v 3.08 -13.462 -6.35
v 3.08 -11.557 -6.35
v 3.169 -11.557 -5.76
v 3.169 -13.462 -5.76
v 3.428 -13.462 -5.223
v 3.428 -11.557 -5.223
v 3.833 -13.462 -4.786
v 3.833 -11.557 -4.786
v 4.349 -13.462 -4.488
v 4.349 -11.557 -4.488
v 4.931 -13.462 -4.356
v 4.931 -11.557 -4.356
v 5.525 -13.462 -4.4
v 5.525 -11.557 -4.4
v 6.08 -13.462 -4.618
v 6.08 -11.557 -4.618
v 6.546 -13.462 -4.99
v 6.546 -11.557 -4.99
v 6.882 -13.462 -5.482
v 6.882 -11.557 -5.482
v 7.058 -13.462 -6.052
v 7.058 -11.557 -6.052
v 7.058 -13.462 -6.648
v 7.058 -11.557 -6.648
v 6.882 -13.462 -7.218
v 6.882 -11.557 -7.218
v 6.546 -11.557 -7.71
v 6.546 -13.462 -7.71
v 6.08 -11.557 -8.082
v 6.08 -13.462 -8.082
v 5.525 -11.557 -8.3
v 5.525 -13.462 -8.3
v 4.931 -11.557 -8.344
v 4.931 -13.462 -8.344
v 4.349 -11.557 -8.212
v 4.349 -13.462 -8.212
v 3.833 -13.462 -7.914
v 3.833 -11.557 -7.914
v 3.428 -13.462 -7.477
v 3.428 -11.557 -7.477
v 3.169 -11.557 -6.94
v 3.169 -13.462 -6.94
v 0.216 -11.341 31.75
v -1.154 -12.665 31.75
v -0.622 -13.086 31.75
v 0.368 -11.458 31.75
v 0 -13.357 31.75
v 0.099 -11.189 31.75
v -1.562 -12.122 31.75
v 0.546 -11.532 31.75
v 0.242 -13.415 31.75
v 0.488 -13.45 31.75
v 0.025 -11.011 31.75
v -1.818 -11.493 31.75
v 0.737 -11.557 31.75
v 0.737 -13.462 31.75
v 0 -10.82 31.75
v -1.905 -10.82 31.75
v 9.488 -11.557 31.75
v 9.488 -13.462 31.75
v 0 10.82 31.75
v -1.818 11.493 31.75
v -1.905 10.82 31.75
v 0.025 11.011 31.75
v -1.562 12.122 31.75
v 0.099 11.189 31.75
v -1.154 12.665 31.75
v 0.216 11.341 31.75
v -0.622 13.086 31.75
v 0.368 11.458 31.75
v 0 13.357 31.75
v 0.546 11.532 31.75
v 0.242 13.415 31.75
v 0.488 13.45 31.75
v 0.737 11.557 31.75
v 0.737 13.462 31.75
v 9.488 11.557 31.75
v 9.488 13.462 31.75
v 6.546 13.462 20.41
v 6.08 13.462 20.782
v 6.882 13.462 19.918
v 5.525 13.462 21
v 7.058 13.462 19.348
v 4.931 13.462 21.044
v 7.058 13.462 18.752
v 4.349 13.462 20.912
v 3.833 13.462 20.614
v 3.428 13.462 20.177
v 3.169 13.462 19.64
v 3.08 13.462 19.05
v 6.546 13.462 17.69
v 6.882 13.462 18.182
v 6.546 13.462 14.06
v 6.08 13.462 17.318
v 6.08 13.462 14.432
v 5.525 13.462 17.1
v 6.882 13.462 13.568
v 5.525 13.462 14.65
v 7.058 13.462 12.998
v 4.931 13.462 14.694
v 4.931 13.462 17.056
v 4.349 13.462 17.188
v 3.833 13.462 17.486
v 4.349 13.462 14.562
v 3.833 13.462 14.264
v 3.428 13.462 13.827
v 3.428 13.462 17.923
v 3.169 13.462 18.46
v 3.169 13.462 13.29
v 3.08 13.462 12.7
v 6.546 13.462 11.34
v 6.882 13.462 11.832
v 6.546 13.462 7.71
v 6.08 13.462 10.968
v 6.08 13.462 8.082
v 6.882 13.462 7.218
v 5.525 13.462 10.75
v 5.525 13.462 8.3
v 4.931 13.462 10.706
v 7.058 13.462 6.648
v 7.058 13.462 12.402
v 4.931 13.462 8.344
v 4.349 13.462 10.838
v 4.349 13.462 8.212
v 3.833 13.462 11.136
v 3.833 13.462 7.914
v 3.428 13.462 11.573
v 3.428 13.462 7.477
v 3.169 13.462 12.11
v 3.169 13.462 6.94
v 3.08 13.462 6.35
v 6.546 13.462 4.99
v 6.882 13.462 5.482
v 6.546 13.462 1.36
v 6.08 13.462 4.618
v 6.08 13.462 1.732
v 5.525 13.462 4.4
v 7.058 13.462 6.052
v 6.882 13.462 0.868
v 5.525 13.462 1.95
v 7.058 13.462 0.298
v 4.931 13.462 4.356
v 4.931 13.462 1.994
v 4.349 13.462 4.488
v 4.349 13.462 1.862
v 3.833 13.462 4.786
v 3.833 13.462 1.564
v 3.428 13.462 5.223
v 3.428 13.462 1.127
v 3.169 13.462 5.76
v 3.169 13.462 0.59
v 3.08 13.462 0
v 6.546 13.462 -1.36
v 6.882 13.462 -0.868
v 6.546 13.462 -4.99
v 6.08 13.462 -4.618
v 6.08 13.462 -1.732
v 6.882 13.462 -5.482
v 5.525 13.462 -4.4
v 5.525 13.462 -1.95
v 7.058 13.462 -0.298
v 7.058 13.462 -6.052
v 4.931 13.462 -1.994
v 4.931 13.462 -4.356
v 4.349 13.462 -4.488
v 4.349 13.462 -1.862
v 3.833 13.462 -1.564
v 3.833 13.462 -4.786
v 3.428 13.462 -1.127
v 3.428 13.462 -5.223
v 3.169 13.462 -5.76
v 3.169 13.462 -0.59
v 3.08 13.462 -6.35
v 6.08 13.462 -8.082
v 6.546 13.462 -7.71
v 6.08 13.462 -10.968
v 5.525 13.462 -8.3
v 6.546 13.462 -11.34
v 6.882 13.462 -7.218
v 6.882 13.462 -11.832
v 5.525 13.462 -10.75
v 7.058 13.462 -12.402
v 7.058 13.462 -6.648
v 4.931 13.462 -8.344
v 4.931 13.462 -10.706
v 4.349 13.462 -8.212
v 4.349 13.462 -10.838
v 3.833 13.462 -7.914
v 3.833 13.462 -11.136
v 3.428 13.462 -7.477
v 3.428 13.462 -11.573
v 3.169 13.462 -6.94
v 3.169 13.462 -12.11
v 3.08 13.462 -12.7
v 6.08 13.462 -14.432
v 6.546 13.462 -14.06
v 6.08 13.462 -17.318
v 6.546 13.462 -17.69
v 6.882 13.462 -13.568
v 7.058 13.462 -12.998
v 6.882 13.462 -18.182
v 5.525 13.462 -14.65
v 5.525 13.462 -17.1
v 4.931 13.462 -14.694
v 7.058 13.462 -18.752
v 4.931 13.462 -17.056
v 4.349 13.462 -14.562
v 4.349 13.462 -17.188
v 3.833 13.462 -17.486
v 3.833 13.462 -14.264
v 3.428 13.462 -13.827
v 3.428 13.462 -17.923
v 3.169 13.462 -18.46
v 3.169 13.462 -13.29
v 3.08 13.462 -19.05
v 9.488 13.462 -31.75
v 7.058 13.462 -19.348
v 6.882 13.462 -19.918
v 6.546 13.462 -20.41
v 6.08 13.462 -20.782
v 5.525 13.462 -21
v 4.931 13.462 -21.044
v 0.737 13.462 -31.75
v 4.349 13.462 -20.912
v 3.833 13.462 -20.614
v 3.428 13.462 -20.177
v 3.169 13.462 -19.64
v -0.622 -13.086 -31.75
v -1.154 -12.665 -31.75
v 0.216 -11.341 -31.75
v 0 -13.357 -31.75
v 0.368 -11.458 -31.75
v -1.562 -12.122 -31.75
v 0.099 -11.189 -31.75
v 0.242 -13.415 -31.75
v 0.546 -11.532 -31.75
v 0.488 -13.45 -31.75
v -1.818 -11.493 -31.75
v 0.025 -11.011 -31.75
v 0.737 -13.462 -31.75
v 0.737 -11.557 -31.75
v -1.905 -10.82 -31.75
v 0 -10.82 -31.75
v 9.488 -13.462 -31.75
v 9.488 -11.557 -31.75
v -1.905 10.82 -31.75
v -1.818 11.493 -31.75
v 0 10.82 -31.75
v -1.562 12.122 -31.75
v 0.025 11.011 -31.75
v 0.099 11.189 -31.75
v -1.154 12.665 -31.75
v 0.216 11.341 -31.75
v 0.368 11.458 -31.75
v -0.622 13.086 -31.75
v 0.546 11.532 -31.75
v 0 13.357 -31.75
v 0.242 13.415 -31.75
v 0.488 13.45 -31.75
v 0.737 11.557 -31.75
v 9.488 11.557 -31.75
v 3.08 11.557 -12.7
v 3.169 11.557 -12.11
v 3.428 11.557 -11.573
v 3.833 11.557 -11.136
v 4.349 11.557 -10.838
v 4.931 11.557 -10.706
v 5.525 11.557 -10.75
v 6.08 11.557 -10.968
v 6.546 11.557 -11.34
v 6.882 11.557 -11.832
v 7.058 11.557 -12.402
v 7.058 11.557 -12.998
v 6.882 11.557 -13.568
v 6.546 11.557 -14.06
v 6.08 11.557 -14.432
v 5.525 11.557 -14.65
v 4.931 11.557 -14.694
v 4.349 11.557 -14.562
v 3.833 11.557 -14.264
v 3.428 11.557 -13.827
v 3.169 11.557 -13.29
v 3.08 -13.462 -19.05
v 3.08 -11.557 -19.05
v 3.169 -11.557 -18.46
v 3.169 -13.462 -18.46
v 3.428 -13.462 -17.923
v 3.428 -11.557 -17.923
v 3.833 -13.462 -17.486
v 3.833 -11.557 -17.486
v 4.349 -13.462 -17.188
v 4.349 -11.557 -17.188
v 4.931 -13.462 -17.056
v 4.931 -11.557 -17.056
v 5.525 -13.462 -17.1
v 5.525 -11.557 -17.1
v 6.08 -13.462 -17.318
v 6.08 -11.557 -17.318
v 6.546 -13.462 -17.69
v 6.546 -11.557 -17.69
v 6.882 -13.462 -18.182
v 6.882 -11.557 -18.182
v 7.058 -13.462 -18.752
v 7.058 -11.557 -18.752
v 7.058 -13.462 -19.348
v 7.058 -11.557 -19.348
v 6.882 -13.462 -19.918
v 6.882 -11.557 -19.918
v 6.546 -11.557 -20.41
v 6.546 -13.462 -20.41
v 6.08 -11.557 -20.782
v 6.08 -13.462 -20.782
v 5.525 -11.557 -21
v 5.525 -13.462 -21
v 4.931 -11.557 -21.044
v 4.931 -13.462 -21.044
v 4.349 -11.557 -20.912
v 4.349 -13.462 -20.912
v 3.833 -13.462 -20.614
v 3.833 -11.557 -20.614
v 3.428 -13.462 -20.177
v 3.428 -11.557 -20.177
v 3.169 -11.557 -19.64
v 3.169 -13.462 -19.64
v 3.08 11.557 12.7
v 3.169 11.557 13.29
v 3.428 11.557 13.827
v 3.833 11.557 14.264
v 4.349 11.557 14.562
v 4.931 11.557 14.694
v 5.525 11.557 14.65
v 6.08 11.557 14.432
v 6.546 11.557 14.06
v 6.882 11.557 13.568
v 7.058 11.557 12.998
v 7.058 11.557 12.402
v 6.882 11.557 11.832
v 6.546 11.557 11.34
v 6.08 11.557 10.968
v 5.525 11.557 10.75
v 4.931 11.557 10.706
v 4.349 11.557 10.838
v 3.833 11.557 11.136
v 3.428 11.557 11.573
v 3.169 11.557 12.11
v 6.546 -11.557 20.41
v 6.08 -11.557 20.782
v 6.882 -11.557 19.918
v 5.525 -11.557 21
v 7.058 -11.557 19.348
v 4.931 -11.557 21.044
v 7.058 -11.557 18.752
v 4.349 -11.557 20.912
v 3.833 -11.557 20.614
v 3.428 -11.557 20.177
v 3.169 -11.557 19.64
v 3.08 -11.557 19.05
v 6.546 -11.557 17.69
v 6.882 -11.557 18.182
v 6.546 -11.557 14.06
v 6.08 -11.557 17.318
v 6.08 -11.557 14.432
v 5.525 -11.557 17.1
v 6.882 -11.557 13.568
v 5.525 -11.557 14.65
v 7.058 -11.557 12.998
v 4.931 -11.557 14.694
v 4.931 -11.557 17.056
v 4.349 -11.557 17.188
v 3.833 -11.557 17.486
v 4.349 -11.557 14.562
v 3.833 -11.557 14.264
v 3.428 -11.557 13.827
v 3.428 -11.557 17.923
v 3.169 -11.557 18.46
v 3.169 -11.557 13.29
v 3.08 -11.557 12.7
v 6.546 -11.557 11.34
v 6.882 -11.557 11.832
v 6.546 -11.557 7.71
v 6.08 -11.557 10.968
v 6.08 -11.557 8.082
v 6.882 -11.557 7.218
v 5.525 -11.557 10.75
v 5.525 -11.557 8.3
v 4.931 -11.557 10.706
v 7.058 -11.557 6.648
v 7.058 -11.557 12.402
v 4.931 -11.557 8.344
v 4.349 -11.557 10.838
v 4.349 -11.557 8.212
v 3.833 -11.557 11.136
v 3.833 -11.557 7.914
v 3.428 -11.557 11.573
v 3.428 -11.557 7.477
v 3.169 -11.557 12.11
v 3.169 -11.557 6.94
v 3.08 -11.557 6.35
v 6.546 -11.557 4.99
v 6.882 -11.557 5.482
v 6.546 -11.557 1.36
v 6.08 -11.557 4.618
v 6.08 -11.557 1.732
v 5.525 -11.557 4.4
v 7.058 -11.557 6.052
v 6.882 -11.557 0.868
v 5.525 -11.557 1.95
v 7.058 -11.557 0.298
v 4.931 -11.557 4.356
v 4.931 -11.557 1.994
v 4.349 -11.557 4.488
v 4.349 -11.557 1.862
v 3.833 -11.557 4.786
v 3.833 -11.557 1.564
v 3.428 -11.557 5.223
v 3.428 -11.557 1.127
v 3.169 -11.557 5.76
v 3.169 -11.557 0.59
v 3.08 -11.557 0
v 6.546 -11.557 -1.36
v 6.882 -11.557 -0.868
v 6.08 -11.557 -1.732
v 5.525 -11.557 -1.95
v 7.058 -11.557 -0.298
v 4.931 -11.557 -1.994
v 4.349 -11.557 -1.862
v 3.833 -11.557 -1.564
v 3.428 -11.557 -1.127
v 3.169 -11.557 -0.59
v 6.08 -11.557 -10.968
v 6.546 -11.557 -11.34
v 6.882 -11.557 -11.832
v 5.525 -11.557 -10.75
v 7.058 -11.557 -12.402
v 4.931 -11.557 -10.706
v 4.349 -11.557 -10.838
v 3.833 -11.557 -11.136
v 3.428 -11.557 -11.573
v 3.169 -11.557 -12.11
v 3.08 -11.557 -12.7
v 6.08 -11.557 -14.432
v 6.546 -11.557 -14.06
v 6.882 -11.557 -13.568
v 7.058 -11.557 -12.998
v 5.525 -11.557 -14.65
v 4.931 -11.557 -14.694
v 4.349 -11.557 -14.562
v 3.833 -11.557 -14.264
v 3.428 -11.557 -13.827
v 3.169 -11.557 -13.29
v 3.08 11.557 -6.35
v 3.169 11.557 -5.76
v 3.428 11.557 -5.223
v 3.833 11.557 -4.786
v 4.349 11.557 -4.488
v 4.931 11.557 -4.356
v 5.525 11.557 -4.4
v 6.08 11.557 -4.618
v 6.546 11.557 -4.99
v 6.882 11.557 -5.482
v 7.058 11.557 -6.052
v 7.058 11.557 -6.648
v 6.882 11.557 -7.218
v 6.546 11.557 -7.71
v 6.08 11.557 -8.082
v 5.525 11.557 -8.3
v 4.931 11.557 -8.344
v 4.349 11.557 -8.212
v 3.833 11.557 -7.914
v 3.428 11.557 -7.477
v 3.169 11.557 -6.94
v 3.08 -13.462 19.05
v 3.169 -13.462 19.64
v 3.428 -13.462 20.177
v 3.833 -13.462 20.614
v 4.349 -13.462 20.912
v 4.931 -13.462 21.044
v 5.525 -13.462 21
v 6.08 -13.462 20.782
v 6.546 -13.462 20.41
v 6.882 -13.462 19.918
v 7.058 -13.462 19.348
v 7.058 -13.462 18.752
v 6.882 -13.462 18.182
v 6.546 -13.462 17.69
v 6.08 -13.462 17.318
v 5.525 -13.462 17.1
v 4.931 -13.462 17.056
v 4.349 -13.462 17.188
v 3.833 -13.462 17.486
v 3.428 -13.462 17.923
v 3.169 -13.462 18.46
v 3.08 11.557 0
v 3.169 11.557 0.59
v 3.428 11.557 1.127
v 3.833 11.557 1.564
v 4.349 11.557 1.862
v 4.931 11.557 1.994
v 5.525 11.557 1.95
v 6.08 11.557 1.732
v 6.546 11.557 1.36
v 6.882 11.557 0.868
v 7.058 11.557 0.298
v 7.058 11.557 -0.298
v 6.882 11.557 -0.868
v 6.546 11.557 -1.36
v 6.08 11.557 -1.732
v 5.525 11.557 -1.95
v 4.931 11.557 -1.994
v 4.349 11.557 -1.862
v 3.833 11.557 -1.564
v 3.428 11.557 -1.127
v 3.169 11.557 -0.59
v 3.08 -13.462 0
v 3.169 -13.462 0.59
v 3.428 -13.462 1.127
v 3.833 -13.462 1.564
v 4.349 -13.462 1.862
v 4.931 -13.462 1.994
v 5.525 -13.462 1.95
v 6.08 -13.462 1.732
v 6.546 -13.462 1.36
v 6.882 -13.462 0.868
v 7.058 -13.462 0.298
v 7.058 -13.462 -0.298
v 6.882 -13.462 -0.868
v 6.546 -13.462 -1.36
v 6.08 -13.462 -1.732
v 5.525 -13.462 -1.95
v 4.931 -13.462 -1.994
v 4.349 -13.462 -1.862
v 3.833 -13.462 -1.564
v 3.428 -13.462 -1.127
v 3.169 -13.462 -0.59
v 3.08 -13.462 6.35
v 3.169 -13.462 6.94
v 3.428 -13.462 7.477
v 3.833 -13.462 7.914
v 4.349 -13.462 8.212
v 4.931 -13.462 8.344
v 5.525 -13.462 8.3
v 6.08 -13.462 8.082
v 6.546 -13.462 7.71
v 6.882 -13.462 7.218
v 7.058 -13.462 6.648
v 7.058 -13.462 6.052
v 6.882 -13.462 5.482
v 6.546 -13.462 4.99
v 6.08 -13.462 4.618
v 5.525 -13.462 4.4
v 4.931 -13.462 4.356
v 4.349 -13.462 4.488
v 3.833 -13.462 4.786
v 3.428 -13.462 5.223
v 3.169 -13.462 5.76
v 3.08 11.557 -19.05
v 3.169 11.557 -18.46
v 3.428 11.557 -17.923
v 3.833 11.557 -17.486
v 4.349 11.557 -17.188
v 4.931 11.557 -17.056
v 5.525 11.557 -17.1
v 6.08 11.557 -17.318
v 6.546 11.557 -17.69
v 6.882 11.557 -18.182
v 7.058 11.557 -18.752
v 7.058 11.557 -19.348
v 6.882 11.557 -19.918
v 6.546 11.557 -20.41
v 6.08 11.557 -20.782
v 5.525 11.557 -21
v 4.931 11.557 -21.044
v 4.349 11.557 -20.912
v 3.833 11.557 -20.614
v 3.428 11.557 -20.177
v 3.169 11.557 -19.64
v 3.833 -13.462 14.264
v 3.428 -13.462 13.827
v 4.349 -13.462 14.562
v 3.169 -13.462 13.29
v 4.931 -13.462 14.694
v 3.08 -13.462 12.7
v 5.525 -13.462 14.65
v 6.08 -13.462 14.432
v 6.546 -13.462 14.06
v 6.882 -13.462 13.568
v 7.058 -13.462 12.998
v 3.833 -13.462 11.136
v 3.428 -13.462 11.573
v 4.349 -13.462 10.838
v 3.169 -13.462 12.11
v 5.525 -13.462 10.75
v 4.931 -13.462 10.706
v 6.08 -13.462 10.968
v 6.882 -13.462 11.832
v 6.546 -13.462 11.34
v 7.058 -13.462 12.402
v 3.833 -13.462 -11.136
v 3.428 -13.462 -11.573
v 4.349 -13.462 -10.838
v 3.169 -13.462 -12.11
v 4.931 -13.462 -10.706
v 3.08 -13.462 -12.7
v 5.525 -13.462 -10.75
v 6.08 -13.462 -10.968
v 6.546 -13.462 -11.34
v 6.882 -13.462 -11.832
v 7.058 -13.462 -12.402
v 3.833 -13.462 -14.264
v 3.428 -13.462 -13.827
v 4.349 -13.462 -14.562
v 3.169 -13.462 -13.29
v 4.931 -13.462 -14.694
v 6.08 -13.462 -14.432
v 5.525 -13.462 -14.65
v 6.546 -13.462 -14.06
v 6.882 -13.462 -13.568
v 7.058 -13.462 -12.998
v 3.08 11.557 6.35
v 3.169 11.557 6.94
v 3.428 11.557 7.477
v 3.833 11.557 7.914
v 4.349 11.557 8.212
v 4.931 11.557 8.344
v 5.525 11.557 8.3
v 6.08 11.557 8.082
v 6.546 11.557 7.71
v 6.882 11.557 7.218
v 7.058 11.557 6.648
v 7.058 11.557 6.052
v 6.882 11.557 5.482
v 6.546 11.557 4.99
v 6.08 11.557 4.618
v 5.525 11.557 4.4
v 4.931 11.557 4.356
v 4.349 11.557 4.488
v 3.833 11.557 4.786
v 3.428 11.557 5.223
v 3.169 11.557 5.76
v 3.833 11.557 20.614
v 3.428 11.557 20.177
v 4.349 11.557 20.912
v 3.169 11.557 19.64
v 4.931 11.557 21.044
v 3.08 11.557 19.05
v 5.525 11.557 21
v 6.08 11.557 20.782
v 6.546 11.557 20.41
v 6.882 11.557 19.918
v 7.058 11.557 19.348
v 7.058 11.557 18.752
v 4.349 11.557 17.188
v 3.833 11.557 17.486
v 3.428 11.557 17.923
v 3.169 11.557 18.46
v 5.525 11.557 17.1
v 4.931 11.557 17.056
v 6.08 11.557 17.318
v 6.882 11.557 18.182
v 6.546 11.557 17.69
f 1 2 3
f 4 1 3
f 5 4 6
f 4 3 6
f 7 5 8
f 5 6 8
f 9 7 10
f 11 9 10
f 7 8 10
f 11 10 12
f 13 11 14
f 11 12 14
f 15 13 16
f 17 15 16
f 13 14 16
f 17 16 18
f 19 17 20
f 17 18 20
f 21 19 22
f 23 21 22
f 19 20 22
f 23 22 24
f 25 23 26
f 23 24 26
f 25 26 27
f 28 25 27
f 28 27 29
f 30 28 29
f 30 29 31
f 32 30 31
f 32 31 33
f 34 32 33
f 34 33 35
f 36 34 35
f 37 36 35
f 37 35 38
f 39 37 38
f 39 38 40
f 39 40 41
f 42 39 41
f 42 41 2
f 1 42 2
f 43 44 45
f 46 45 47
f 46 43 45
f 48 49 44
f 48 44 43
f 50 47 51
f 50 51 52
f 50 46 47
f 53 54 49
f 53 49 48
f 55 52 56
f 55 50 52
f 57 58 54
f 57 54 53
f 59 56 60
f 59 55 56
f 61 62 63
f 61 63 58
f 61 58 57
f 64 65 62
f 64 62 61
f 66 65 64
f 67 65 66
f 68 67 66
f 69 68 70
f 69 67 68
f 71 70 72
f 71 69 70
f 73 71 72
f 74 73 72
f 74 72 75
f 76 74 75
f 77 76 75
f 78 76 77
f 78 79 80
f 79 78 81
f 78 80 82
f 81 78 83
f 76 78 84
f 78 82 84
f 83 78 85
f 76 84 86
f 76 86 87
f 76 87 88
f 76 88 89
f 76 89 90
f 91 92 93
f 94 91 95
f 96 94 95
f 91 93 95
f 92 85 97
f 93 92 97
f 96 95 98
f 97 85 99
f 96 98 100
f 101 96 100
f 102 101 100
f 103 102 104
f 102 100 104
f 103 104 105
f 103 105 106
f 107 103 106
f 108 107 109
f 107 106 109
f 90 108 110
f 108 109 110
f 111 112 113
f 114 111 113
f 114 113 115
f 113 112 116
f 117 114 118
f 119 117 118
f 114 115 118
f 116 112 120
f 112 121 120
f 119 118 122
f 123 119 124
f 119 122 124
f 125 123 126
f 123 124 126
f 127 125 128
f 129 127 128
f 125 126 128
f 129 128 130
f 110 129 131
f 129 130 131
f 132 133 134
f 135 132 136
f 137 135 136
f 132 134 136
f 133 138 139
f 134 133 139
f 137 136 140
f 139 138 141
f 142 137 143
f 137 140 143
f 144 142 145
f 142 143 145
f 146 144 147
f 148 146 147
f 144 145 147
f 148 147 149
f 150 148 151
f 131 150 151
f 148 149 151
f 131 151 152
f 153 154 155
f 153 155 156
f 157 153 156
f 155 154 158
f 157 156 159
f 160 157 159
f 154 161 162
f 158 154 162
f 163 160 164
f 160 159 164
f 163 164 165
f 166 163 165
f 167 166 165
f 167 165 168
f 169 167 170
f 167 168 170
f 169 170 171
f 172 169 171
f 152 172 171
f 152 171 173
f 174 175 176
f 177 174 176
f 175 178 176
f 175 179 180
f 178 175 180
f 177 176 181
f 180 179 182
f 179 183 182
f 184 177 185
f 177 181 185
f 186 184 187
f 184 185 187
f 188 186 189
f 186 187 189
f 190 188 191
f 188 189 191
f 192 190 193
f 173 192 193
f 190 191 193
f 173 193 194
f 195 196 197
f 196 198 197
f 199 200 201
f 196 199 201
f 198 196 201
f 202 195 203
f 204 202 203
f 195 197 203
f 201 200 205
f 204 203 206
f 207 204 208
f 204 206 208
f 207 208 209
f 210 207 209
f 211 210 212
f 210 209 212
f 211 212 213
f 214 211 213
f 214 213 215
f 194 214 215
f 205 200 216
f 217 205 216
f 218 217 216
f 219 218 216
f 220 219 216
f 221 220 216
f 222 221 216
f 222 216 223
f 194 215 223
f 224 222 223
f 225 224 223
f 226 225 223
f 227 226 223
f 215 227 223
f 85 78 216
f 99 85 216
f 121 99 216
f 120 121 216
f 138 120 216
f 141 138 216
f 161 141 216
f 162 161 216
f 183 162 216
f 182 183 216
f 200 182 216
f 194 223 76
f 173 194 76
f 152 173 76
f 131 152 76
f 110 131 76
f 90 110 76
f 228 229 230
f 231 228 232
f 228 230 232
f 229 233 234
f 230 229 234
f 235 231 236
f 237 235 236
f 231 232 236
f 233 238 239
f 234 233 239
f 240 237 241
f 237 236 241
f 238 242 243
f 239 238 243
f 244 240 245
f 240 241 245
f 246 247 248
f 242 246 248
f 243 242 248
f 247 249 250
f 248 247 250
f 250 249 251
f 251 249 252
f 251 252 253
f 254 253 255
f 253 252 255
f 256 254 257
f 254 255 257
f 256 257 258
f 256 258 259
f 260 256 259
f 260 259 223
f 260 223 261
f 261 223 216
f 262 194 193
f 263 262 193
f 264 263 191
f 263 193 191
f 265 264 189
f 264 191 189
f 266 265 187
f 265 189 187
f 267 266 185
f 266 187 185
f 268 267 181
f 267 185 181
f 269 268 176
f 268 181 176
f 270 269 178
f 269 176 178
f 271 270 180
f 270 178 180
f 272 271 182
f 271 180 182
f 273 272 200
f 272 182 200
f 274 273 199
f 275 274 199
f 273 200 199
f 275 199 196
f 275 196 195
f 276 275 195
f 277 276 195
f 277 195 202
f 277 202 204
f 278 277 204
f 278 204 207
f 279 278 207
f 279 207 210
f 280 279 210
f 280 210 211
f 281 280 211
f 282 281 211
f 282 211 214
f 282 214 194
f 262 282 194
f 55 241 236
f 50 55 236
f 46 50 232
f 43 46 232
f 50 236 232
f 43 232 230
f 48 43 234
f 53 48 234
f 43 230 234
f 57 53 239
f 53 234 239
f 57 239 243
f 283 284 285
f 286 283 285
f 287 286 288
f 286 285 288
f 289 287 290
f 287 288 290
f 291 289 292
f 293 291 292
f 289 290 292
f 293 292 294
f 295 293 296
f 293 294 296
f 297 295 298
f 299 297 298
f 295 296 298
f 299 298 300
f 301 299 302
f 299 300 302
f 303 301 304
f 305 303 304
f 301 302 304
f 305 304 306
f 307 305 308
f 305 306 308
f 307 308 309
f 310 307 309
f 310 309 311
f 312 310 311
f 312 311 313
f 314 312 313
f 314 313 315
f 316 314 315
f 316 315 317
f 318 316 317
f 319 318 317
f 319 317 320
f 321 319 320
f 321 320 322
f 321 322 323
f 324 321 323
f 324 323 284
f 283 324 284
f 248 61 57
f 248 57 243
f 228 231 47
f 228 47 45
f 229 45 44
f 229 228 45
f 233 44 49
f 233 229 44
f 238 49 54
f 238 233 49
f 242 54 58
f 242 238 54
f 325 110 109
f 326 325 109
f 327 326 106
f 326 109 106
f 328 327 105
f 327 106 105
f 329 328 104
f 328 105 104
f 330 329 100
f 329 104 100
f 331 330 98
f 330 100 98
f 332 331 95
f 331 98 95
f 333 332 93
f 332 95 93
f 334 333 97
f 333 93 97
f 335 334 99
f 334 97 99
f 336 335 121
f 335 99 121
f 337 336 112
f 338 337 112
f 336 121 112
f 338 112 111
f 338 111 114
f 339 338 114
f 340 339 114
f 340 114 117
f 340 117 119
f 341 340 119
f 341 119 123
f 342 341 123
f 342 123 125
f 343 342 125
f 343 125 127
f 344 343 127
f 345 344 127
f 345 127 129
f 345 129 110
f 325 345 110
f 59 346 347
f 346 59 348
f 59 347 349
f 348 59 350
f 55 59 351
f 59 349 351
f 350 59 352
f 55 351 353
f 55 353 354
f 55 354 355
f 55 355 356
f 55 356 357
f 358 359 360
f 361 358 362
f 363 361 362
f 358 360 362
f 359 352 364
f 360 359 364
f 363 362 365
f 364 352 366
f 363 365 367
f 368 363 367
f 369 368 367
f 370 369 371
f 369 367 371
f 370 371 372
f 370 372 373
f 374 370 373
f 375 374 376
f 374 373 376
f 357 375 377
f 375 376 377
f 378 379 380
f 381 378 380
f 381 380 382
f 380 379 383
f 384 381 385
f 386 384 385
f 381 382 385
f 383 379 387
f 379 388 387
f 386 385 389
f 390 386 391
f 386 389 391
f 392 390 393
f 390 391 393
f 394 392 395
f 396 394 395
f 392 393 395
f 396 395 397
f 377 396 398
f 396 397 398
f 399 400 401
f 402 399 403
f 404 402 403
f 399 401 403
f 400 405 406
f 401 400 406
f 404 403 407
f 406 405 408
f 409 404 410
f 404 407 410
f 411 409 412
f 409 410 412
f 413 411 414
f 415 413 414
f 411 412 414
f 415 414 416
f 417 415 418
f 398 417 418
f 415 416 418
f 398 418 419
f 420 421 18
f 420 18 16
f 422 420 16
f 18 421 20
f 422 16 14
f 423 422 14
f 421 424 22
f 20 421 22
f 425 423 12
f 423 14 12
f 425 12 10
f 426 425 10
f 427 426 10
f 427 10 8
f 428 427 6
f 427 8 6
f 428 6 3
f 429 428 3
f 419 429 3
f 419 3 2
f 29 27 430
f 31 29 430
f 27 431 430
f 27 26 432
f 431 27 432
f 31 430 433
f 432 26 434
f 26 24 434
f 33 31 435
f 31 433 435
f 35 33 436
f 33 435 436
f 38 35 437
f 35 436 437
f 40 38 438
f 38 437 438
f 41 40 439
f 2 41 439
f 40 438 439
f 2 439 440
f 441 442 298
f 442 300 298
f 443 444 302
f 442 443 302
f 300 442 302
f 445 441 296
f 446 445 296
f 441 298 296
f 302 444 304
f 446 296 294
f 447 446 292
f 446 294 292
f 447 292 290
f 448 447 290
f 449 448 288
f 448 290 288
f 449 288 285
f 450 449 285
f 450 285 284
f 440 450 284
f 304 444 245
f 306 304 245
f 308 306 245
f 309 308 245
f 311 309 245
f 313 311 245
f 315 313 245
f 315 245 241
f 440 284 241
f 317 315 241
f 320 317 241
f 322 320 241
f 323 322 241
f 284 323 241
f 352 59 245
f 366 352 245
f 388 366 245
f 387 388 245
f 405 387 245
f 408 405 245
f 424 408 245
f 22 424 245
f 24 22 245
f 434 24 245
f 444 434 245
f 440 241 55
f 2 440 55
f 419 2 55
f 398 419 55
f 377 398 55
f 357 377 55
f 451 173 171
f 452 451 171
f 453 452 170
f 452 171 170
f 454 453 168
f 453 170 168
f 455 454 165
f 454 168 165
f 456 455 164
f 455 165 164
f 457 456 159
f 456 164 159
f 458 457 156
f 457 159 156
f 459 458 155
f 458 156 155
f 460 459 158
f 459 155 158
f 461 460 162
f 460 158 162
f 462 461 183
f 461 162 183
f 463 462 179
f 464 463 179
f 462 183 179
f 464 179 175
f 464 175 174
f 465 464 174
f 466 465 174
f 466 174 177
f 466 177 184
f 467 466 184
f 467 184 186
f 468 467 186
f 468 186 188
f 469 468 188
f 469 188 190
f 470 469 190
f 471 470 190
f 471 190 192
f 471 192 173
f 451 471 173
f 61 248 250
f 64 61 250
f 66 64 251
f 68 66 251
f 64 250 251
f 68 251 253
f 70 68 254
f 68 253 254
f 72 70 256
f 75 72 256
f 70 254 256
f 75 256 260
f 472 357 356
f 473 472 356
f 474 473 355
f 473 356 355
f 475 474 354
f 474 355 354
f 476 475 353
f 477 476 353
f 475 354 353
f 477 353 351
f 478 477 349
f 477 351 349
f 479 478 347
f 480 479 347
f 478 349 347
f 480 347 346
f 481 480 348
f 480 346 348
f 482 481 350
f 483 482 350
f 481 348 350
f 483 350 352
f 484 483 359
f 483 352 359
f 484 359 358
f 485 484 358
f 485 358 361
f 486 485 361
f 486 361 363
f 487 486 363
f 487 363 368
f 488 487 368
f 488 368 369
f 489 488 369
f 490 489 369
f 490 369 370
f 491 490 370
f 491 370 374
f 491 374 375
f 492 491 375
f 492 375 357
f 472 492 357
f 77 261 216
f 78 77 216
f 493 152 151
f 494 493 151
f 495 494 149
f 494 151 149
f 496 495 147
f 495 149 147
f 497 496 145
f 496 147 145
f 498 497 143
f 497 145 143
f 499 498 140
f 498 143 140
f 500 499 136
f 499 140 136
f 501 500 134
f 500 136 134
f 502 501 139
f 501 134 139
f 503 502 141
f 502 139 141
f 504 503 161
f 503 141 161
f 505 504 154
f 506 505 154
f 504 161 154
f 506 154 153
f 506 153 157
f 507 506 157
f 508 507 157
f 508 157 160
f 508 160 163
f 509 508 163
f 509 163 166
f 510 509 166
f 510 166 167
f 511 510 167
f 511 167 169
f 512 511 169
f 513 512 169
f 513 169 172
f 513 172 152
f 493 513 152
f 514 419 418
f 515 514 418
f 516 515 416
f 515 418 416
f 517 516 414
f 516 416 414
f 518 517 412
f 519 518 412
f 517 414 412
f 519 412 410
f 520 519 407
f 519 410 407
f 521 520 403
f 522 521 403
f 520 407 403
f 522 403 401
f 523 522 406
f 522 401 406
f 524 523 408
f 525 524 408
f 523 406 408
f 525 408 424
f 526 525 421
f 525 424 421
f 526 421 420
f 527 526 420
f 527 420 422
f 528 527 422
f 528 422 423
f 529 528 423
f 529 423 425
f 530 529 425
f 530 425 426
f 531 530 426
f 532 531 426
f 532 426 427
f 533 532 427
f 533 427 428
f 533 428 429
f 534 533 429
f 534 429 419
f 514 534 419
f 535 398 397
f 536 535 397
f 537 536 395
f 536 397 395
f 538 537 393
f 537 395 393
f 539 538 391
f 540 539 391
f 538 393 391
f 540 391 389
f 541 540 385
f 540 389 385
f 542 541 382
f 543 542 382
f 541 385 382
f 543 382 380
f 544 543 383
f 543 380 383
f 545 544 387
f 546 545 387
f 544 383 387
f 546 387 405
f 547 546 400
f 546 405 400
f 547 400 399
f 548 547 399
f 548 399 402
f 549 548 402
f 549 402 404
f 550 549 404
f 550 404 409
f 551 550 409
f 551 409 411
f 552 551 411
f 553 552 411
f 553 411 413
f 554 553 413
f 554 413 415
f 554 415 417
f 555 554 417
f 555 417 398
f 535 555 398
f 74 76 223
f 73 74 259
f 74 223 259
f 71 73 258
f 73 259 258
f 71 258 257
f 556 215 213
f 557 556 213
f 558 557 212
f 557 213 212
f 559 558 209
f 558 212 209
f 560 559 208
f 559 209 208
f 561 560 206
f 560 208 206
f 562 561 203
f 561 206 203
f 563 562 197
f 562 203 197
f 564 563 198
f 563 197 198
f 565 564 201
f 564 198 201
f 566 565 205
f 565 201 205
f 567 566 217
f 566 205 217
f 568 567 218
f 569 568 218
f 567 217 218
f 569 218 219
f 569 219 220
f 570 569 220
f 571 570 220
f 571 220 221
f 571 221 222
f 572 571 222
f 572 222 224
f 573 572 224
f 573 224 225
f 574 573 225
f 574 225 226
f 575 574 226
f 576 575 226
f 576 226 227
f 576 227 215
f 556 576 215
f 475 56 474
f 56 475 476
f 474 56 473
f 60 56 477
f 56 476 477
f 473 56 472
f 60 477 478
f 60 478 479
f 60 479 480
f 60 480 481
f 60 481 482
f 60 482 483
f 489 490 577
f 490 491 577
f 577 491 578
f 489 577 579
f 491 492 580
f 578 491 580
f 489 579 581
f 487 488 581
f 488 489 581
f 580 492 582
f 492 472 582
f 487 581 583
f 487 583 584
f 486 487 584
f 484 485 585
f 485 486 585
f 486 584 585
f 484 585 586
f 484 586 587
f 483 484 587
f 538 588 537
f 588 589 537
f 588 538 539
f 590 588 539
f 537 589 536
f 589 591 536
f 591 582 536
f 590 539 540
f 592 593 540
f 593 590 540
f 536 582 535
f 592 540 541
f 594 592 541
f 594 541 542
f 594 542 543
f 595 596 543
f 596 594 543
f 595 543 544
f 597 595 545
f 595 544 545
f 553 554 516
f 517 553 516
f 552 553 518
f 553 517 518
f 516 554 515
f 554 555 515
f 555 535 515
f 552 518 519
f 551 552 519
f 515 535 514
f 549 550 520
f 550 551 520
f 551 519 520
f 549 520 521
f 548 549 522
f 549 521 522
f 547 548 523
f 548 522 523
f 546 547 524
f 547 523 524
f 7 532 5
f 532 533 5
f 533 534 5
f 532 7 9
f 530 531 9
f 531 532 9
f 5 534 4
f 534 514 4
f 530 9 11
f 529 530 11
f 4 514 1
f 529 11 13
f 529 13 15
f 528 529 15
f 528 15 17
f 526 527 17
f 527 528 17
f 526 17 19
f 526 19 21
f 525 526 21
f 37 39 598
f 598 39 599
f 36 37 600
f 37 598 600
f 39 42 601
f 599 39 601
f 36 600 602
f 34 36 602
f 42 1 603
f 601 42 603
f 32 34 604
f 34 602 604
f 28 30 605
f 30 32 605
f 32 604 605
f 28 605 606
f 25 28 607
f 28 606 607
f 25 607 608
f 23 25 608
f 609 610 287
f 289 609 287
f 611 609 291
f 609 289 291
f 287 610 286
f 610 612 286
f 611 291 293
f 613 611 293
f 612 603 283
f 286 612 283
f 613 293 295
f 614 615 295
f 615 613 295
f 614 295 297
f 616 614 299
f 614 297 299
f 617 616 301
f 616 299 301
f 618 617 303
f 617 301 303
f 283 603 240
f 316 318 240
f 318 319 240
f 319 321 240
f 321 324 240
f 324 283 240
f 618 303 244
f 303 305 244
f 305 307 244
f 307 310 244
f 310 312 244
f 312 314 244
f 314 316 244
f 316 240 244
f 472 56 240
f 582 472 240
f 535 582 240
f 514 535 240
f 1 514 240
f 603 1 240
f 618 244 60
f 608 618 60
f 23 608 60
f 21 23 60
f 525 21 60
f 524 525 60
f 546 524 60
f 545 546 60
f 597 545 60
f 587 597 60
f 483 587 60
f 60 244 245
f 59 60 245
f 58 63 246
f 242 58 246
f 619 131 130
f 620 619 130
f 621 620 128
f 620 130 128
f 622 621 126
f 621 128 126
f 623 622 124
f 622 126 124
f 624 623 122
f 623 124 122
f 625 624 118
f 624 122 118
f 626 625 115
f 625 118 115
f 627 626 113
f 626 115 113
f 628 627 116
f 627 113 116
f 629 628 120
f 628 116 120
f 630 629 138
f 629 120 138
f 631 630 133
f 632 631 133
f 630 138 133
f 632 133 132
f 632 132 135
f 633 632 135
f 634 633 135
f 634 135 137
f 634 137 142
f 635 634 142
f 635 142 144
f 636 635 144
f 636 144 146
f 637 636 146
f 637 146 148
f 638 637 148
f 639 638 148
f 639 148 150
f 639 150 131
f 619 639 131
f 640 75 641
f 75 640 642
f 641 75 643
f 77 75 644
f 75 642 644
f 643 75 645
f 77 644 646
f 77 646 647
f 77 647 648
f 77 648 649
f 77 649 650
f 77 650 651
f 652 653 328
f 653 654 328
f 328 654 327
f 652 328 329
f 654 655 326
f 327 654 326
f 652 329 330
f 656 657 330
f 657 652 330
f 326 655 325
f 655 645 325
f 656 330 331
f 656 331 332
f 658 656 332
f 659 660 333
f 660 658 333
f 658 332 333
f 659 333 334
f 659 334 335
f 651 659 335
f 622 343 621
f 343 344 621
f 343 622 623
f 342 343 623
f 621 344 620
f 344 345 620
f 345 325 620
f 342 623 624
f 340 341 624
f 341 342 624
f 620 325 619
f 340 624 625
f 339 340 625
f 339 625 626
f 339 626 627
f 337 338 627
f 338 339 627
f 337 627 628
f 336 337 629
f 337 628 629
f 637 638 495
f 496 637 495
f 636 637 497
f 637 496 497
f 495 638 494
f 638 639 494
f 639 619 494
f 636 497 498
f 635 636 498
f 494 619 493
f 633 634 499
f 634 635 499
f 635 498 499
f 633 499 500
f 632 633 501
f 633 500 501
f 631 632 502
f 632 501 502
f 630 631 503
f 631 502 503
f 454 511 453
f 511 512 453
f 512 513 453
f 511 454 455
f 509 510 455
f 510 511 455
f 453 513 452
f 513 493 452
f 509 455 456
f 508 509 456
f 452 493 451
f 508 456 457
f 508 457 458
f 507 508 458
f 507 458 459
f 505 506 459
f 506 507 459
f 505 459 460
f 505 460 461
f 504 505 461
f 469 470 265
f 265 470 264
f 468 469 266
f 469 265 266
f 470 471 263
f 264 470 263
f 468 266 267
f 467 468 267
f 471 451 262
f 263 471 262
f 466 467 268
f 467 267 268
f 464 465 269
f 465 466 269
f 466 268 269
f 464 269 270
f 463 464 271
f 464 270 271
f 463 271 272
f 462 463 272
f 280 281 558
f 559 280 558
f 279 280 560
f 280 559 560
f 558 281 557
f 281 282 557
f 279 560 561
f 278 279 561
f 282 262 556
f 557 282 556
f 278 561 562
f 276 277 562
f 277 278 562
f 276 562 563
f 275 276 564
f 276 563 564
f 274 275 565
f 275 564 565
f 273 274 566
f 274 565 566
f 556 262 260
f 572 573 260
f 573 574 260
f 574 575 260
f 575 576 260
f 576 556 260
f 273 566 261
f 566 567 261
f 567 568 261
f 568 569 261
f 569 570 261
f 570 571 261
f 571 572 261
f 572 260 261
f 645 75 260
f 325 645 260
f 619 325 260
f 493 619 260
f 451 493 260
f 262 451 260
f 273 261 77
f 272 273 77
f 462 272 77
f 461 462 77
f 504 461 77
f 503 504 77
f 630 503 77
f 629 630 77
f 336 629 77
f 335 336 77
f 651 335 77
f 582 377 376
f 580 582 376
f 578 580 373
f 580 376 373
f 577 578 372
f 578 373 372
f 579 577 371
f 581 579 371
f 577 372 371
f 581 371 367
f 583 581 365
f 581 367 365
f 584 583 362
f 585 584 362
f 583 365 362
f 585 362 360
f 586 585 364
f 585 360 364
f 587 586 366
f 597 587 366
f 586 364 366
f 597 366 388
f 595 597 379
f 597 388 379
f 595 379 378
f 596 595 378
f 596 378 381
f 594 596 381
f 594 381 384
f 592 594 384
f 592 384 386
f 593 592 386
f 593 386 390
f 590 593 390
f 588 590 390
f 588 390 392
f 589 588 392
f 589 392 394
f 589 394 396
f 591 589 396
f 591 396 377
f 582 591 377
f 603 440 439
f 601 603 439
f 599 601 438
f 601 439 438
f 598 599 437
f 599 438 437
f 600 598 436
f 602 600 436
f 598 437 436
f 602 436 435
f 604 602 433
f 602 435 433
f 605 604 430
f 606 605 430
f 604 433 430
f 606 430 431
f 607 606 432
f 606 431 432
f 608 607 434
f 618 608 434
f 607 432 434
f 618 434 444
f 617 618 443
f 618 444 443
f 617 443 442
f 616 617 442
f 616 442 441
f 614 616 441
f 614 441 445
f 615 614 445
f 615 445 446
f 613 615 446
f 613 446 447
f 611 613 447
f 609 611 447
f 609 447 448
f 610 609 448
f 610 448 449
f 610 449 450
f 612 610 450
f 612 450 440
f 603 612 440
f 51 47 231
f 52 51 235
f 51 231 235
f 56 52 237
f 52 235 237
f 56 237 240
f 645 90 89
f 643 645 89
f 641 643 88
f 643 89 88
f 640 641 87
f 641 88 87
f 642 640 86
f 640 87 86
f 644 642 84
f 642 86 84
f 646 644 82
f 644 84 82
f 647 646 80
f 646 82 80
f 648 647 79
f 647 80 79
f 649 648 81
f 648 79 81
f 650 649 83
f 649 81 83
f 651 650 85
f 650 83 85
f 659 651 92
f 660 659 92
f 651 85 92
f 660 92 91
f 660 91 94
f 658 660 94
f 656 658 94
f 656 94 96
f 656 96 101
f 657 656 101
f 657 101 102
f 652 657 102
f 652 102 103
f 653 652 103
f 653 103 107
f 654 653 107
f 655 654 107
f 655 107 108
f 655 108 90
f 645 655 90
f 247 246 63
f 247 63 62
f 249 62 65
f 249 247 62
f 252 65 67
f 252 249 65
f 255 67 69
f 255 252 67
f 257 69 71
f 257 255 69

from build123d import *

# Parameters (mm, degrees)
SKETCH4_W              = 63.5
SKETCH4_H              = 44.45
BASE_FLANGE1_DEPTH     = 1.905
SKETCHED_START         = -31.75
SKETCHED_BEND3_DEPTH   = 63.5
SKETCHED_BEND3_2_DEPTH = 63.5
CUT_EXTRUDE2_REACH     = 44.696
SKETCH20_R             = 2


# Read off the part's stored shape, not the designer's step: Sketched Bend3
# Sheet-metal steps are written as plain solids
with BuildPart() as part:
    # Sketch4 → Base-Flange1 (new body)
    with BuildSketch(Plane(origin=(0, 0, 0), x_dir=(0, 0, -1), z_dir=(1, 0, 0))):
        Rectangle(SKETCH4_W, SKETCH4_H)
    extrude(amount=-BASE_FLANGE1_DEPTH)

    # Sketched Bend3 outline → Sketched Bend3 (cut)
    with BuildSketch(Plane.XY.offset(SKETCHED_START)):
        with BuildLine():
            ThreePointArc((0, -13.357223013), (-1.375727285, -12.406629491), (-1.905, -10.8204))
            Line((-1.905, -10.8204), (-1.905, -22.225))
            Line((-1.905, -22.225), (0, -22.225))
            Line((0, -22.225), (0, -13.357223013))
        make_face()
        with BuildLine():
            Line((-1.905, 22.225), (-1.905, 10.8204))
            ThreePointArc((-1.905, 10.8204), (-1.375727285, 12.406629491), (0, 13.357223013))
            Line((0, 13.357223013), (0, 22.225))
            Line((0, 22.225), (-1.905, 22.225))
        make_face()
    extrude(amount=SKETCHED_BEND3_DEPTH, mode=Mode.SUBTRACT)

    # Sketched Bend3 2 outline → Sketched Bend3 2 (add)
    with BuildSketch(Plane.XY.offset(SKETCHED_START)):
        with BuildLine():
            Line((0, -10.8204), (0, -13.357223013))
            ThreePointArc((0, -13.357223013), (0.364592683, -13.435674577), (0.7366, -13.462))
            Line((0.7366, -13.462), (9.487967924, -13.462))
            Line((9.487967924, -13.462), (9.487967924, -11.557))
            Line((9.487967924, -11.557), (0.7366, -11.557))
            ThreePointArc((0.7366, -11.557), (0.215745145, -11.341254855), (0, -10.8204))
        make_face()
        with BuildLine():
            ThreePointArc((0.7366, 13.462), (0.364592683, 13.435674577), (0, 13.357223013))
            Line((0, 13.357223013), (0, 10.8204))
            ThreePointArc((0, 10.8204), (0.215745145, 11.341254855), (0.7366, 11.557))
            Line((0.7366, 11.557), (9.487967924, 11.557))
            Line((9.487967924, 11.557), (9.487967924, 13.462))
            Line((9.487967924, 13.462), (0.7366, 13.462))
        make_face()
    extrude(amount=SKETCHED_BEND3_2_DEPTH)

    # Cut-Extrude2: up to this face of the body (flat: up to its plane)
    cut_extrude2_end = Plane(part.part.faces().sort_by_distance((5.112283962, -13.462, 0))[0])
    # Sketch20 → Cut-Extrude2 (cut, up to the picked face)
    with BuildSketch(Plane(origin=(0, 13.462, 0), x_dir=(1, 0, 0), z_dir=(0, 1, 0)), mode=Mode.PRIVATE) as cut_extrude2_sk1:
        with Locations(Location((5.08, 0, 0), (0, 0, 180))):
            Circle(SKETCH20_R)
    cut_extrude2_tool1 = split(extrude(cut_extrude2_sk1.sketch, amount=-CUT_EXTRUDE2_REACH, mode=Mode.PRIVATE), bisect_by=cut_extrude2_end, keep=Keep.BOTH, mode=Mode.PRIVATE)
    # Sketch20 → Cut-Extrude2 (cut, up to the picked face)
    with BuildSketch(Plane(origin=(0, 13.462, 0), x_dir=(1, 0, 0), z_dir=(0, 1, 0)), mode=Mode.PRIVATE) as cut_extrude2_sk2:
        with Locations(Location((5.08, 6.35, 0), (0, 0, 180))):
            Circle(SKETCH20_R)
    cut_extrude2_tool2 = split(extrude(cut_extrude2_sk2.sketch, amount=-CUT_EXTRUDE2_REACH, mode=Mode.PRIVATE), bisect_by=cut_extrude2_end, keep=Keep.BOTH, mode=Mode.PRIVATE)
    # Sketch20 → Cut-Extrude2 (cut, up to the picked face)
    with BuildSketch(Plane(origin=(0, 13.462, 0), x_dir=(1, 0, 0), z_dir=(0, 1, 0)), mode=Mode.PRIVATE) as cut_extrude2_sk3:
        with Locations(Location((5.08, 12.7, 0), (0, 0, 180))):
            Circle(SKETCH20_R)
    cut_extrude2_tool3 = split(extrude(cut_extrude2_sk3.sketch, amount=-CUT_EXTRUDE2_REACH, mode=Mode.PRIVATE), bisect_by=cut_extrude2_end, keep=Keep.BOTH, mode=Mode.PRIVATE)
    # Sketch20 → Cut-Extrude2 (cut, up to the picked face)
    with BuildSketch(Plane(origin=(0, 13.462, 0), x_dir=(1, 0, 0), z_dir=(0, 1, 0)), mode=Mode.PRIVATE) as cut_extrude2_sk4:
        with Locations(Location((5.08, 19.05, 0), (0, 0, 180))):
            Circle(SKETCH20_R)
    cut_extrude2_tool4 = split(extrude(cut_extrude2_sk4.sketch, amount=-CUT_EXTRUDE2_REACH, mode=Mode.PRIVATE), bisect_by=cut_extrude2_end, keep=Keep.BOTH, mode=Mode.PRIVATE)
    # Sketch20 → Cut-Extrude2 (cut, up to the picked face)
    with BuildSketch(Plane(origin=(0, 13.462, 0), x_dir=(1, 0, 0), z_dir=(0, 1, 0)), mode=Mode.PRIVATE) as cut_extrude2_sk5:
        with Locations(Location((5.08, -6.35, 0), (0, 0, 180))):
            Circle(SKETCH20_R)
    cut_extrude2_tool5 = split(extrude(cut_extrude2_sk5.sketch, amount=-CUT_EXTRUDE2_REACH, mode=Mode.PRIVATE), bisect_by=cut_extrude2_end, keep=Keep.BOTH, mode=Mode.PRIVATE)
    # Sketch20 → Cut-Extrude2 (cut, up to the picked face)
    with BuildSketch(Plane(origin=(0, 13.462, 0), x_dir=(1, 0, 0), z_dir=(0, 1, 0)), mode=Mode.PRIVATE) as cut_extrude2_sk6:
        with Locations(Location((5.08, -12.7, 0), (0, 0, 180))):
            Circle(SKETCH20_R)
    cut_extrude2_tool6 = split(extrude(cut_extrude2_sk6.sketch, amount=-CUT_EXTRUDE2_REACH, mode=Mode.PRIVATE), bisect_by=cut_extrude2_end, keep=Keep.BOTH, mode=Mode.PRIVATE)
    # Sketch20 → Cut-Extrude2 (cut, up to the picked face)
    with BuildSketch(Plane(origin=(0, 13.462, 0), x_dir=(1, 0, 0), z_dir=(0, 1, 0)), mode=Mode.PRIVATE) as cut_extrude2_sk7:
        with Locations(Location((5.08, -19.05, 0), (0, 0, 180))):
            Circle(SKETCH20_R)
    cut_extrude2_tool7 = split(extrude(cut_extrude2_sk7.sketch, amount=-CUT_EXTRUDE2_REACH, mode=Mode.PRIVATE), bisect_by=cut_extrude2_end, keep=Keep.BOTH, mode=Mode.PRIVATE)
    add(cut_extrude2_tool1.solids().sort_by(Axis((5.08, 13.462, 0), (0, -1, 0)))[0], mode=Mode.SUBTRACT)
    add(cut_extrude2_tool2.solids().sort_by(Axis((5.08, 13.462, -6.35), (0, -1, 0)))[0], mode=Mode.SUBTRACT)
    add(cut_extrude2_tool3.solids().sort_by(Axis((5.08, 13.462, -12.7), (0, -1, 0)))[0], mode=Mode.SUBTRACT)
    add(cut_extrude2_tool4.solids().sort_by(Axis((5.08, 13.462, -19.05), (0, -1, 0)))[0], mode=Mode.SUBTRACT)
    add(cut_extrude2_tool5.solids().sort_by(Axis((5.08, 13.462, 6.35), (0, -1, 0)))[0], mode=Mode.SUBTRACT)
    add(cut_extrude2_tool6.solids().sort_by(Axis((5.08, 13.462, 12.7), (0, -1, 0)))[0], mode=Mode.SUBTRACT)
    add(cut_extrude2_tool7.solids().sort_by(Axis((5.08, 13.462, 19.05), (0, -1, 0)))[0], mode=Mode.SUBTRACT)


solid = part.part
